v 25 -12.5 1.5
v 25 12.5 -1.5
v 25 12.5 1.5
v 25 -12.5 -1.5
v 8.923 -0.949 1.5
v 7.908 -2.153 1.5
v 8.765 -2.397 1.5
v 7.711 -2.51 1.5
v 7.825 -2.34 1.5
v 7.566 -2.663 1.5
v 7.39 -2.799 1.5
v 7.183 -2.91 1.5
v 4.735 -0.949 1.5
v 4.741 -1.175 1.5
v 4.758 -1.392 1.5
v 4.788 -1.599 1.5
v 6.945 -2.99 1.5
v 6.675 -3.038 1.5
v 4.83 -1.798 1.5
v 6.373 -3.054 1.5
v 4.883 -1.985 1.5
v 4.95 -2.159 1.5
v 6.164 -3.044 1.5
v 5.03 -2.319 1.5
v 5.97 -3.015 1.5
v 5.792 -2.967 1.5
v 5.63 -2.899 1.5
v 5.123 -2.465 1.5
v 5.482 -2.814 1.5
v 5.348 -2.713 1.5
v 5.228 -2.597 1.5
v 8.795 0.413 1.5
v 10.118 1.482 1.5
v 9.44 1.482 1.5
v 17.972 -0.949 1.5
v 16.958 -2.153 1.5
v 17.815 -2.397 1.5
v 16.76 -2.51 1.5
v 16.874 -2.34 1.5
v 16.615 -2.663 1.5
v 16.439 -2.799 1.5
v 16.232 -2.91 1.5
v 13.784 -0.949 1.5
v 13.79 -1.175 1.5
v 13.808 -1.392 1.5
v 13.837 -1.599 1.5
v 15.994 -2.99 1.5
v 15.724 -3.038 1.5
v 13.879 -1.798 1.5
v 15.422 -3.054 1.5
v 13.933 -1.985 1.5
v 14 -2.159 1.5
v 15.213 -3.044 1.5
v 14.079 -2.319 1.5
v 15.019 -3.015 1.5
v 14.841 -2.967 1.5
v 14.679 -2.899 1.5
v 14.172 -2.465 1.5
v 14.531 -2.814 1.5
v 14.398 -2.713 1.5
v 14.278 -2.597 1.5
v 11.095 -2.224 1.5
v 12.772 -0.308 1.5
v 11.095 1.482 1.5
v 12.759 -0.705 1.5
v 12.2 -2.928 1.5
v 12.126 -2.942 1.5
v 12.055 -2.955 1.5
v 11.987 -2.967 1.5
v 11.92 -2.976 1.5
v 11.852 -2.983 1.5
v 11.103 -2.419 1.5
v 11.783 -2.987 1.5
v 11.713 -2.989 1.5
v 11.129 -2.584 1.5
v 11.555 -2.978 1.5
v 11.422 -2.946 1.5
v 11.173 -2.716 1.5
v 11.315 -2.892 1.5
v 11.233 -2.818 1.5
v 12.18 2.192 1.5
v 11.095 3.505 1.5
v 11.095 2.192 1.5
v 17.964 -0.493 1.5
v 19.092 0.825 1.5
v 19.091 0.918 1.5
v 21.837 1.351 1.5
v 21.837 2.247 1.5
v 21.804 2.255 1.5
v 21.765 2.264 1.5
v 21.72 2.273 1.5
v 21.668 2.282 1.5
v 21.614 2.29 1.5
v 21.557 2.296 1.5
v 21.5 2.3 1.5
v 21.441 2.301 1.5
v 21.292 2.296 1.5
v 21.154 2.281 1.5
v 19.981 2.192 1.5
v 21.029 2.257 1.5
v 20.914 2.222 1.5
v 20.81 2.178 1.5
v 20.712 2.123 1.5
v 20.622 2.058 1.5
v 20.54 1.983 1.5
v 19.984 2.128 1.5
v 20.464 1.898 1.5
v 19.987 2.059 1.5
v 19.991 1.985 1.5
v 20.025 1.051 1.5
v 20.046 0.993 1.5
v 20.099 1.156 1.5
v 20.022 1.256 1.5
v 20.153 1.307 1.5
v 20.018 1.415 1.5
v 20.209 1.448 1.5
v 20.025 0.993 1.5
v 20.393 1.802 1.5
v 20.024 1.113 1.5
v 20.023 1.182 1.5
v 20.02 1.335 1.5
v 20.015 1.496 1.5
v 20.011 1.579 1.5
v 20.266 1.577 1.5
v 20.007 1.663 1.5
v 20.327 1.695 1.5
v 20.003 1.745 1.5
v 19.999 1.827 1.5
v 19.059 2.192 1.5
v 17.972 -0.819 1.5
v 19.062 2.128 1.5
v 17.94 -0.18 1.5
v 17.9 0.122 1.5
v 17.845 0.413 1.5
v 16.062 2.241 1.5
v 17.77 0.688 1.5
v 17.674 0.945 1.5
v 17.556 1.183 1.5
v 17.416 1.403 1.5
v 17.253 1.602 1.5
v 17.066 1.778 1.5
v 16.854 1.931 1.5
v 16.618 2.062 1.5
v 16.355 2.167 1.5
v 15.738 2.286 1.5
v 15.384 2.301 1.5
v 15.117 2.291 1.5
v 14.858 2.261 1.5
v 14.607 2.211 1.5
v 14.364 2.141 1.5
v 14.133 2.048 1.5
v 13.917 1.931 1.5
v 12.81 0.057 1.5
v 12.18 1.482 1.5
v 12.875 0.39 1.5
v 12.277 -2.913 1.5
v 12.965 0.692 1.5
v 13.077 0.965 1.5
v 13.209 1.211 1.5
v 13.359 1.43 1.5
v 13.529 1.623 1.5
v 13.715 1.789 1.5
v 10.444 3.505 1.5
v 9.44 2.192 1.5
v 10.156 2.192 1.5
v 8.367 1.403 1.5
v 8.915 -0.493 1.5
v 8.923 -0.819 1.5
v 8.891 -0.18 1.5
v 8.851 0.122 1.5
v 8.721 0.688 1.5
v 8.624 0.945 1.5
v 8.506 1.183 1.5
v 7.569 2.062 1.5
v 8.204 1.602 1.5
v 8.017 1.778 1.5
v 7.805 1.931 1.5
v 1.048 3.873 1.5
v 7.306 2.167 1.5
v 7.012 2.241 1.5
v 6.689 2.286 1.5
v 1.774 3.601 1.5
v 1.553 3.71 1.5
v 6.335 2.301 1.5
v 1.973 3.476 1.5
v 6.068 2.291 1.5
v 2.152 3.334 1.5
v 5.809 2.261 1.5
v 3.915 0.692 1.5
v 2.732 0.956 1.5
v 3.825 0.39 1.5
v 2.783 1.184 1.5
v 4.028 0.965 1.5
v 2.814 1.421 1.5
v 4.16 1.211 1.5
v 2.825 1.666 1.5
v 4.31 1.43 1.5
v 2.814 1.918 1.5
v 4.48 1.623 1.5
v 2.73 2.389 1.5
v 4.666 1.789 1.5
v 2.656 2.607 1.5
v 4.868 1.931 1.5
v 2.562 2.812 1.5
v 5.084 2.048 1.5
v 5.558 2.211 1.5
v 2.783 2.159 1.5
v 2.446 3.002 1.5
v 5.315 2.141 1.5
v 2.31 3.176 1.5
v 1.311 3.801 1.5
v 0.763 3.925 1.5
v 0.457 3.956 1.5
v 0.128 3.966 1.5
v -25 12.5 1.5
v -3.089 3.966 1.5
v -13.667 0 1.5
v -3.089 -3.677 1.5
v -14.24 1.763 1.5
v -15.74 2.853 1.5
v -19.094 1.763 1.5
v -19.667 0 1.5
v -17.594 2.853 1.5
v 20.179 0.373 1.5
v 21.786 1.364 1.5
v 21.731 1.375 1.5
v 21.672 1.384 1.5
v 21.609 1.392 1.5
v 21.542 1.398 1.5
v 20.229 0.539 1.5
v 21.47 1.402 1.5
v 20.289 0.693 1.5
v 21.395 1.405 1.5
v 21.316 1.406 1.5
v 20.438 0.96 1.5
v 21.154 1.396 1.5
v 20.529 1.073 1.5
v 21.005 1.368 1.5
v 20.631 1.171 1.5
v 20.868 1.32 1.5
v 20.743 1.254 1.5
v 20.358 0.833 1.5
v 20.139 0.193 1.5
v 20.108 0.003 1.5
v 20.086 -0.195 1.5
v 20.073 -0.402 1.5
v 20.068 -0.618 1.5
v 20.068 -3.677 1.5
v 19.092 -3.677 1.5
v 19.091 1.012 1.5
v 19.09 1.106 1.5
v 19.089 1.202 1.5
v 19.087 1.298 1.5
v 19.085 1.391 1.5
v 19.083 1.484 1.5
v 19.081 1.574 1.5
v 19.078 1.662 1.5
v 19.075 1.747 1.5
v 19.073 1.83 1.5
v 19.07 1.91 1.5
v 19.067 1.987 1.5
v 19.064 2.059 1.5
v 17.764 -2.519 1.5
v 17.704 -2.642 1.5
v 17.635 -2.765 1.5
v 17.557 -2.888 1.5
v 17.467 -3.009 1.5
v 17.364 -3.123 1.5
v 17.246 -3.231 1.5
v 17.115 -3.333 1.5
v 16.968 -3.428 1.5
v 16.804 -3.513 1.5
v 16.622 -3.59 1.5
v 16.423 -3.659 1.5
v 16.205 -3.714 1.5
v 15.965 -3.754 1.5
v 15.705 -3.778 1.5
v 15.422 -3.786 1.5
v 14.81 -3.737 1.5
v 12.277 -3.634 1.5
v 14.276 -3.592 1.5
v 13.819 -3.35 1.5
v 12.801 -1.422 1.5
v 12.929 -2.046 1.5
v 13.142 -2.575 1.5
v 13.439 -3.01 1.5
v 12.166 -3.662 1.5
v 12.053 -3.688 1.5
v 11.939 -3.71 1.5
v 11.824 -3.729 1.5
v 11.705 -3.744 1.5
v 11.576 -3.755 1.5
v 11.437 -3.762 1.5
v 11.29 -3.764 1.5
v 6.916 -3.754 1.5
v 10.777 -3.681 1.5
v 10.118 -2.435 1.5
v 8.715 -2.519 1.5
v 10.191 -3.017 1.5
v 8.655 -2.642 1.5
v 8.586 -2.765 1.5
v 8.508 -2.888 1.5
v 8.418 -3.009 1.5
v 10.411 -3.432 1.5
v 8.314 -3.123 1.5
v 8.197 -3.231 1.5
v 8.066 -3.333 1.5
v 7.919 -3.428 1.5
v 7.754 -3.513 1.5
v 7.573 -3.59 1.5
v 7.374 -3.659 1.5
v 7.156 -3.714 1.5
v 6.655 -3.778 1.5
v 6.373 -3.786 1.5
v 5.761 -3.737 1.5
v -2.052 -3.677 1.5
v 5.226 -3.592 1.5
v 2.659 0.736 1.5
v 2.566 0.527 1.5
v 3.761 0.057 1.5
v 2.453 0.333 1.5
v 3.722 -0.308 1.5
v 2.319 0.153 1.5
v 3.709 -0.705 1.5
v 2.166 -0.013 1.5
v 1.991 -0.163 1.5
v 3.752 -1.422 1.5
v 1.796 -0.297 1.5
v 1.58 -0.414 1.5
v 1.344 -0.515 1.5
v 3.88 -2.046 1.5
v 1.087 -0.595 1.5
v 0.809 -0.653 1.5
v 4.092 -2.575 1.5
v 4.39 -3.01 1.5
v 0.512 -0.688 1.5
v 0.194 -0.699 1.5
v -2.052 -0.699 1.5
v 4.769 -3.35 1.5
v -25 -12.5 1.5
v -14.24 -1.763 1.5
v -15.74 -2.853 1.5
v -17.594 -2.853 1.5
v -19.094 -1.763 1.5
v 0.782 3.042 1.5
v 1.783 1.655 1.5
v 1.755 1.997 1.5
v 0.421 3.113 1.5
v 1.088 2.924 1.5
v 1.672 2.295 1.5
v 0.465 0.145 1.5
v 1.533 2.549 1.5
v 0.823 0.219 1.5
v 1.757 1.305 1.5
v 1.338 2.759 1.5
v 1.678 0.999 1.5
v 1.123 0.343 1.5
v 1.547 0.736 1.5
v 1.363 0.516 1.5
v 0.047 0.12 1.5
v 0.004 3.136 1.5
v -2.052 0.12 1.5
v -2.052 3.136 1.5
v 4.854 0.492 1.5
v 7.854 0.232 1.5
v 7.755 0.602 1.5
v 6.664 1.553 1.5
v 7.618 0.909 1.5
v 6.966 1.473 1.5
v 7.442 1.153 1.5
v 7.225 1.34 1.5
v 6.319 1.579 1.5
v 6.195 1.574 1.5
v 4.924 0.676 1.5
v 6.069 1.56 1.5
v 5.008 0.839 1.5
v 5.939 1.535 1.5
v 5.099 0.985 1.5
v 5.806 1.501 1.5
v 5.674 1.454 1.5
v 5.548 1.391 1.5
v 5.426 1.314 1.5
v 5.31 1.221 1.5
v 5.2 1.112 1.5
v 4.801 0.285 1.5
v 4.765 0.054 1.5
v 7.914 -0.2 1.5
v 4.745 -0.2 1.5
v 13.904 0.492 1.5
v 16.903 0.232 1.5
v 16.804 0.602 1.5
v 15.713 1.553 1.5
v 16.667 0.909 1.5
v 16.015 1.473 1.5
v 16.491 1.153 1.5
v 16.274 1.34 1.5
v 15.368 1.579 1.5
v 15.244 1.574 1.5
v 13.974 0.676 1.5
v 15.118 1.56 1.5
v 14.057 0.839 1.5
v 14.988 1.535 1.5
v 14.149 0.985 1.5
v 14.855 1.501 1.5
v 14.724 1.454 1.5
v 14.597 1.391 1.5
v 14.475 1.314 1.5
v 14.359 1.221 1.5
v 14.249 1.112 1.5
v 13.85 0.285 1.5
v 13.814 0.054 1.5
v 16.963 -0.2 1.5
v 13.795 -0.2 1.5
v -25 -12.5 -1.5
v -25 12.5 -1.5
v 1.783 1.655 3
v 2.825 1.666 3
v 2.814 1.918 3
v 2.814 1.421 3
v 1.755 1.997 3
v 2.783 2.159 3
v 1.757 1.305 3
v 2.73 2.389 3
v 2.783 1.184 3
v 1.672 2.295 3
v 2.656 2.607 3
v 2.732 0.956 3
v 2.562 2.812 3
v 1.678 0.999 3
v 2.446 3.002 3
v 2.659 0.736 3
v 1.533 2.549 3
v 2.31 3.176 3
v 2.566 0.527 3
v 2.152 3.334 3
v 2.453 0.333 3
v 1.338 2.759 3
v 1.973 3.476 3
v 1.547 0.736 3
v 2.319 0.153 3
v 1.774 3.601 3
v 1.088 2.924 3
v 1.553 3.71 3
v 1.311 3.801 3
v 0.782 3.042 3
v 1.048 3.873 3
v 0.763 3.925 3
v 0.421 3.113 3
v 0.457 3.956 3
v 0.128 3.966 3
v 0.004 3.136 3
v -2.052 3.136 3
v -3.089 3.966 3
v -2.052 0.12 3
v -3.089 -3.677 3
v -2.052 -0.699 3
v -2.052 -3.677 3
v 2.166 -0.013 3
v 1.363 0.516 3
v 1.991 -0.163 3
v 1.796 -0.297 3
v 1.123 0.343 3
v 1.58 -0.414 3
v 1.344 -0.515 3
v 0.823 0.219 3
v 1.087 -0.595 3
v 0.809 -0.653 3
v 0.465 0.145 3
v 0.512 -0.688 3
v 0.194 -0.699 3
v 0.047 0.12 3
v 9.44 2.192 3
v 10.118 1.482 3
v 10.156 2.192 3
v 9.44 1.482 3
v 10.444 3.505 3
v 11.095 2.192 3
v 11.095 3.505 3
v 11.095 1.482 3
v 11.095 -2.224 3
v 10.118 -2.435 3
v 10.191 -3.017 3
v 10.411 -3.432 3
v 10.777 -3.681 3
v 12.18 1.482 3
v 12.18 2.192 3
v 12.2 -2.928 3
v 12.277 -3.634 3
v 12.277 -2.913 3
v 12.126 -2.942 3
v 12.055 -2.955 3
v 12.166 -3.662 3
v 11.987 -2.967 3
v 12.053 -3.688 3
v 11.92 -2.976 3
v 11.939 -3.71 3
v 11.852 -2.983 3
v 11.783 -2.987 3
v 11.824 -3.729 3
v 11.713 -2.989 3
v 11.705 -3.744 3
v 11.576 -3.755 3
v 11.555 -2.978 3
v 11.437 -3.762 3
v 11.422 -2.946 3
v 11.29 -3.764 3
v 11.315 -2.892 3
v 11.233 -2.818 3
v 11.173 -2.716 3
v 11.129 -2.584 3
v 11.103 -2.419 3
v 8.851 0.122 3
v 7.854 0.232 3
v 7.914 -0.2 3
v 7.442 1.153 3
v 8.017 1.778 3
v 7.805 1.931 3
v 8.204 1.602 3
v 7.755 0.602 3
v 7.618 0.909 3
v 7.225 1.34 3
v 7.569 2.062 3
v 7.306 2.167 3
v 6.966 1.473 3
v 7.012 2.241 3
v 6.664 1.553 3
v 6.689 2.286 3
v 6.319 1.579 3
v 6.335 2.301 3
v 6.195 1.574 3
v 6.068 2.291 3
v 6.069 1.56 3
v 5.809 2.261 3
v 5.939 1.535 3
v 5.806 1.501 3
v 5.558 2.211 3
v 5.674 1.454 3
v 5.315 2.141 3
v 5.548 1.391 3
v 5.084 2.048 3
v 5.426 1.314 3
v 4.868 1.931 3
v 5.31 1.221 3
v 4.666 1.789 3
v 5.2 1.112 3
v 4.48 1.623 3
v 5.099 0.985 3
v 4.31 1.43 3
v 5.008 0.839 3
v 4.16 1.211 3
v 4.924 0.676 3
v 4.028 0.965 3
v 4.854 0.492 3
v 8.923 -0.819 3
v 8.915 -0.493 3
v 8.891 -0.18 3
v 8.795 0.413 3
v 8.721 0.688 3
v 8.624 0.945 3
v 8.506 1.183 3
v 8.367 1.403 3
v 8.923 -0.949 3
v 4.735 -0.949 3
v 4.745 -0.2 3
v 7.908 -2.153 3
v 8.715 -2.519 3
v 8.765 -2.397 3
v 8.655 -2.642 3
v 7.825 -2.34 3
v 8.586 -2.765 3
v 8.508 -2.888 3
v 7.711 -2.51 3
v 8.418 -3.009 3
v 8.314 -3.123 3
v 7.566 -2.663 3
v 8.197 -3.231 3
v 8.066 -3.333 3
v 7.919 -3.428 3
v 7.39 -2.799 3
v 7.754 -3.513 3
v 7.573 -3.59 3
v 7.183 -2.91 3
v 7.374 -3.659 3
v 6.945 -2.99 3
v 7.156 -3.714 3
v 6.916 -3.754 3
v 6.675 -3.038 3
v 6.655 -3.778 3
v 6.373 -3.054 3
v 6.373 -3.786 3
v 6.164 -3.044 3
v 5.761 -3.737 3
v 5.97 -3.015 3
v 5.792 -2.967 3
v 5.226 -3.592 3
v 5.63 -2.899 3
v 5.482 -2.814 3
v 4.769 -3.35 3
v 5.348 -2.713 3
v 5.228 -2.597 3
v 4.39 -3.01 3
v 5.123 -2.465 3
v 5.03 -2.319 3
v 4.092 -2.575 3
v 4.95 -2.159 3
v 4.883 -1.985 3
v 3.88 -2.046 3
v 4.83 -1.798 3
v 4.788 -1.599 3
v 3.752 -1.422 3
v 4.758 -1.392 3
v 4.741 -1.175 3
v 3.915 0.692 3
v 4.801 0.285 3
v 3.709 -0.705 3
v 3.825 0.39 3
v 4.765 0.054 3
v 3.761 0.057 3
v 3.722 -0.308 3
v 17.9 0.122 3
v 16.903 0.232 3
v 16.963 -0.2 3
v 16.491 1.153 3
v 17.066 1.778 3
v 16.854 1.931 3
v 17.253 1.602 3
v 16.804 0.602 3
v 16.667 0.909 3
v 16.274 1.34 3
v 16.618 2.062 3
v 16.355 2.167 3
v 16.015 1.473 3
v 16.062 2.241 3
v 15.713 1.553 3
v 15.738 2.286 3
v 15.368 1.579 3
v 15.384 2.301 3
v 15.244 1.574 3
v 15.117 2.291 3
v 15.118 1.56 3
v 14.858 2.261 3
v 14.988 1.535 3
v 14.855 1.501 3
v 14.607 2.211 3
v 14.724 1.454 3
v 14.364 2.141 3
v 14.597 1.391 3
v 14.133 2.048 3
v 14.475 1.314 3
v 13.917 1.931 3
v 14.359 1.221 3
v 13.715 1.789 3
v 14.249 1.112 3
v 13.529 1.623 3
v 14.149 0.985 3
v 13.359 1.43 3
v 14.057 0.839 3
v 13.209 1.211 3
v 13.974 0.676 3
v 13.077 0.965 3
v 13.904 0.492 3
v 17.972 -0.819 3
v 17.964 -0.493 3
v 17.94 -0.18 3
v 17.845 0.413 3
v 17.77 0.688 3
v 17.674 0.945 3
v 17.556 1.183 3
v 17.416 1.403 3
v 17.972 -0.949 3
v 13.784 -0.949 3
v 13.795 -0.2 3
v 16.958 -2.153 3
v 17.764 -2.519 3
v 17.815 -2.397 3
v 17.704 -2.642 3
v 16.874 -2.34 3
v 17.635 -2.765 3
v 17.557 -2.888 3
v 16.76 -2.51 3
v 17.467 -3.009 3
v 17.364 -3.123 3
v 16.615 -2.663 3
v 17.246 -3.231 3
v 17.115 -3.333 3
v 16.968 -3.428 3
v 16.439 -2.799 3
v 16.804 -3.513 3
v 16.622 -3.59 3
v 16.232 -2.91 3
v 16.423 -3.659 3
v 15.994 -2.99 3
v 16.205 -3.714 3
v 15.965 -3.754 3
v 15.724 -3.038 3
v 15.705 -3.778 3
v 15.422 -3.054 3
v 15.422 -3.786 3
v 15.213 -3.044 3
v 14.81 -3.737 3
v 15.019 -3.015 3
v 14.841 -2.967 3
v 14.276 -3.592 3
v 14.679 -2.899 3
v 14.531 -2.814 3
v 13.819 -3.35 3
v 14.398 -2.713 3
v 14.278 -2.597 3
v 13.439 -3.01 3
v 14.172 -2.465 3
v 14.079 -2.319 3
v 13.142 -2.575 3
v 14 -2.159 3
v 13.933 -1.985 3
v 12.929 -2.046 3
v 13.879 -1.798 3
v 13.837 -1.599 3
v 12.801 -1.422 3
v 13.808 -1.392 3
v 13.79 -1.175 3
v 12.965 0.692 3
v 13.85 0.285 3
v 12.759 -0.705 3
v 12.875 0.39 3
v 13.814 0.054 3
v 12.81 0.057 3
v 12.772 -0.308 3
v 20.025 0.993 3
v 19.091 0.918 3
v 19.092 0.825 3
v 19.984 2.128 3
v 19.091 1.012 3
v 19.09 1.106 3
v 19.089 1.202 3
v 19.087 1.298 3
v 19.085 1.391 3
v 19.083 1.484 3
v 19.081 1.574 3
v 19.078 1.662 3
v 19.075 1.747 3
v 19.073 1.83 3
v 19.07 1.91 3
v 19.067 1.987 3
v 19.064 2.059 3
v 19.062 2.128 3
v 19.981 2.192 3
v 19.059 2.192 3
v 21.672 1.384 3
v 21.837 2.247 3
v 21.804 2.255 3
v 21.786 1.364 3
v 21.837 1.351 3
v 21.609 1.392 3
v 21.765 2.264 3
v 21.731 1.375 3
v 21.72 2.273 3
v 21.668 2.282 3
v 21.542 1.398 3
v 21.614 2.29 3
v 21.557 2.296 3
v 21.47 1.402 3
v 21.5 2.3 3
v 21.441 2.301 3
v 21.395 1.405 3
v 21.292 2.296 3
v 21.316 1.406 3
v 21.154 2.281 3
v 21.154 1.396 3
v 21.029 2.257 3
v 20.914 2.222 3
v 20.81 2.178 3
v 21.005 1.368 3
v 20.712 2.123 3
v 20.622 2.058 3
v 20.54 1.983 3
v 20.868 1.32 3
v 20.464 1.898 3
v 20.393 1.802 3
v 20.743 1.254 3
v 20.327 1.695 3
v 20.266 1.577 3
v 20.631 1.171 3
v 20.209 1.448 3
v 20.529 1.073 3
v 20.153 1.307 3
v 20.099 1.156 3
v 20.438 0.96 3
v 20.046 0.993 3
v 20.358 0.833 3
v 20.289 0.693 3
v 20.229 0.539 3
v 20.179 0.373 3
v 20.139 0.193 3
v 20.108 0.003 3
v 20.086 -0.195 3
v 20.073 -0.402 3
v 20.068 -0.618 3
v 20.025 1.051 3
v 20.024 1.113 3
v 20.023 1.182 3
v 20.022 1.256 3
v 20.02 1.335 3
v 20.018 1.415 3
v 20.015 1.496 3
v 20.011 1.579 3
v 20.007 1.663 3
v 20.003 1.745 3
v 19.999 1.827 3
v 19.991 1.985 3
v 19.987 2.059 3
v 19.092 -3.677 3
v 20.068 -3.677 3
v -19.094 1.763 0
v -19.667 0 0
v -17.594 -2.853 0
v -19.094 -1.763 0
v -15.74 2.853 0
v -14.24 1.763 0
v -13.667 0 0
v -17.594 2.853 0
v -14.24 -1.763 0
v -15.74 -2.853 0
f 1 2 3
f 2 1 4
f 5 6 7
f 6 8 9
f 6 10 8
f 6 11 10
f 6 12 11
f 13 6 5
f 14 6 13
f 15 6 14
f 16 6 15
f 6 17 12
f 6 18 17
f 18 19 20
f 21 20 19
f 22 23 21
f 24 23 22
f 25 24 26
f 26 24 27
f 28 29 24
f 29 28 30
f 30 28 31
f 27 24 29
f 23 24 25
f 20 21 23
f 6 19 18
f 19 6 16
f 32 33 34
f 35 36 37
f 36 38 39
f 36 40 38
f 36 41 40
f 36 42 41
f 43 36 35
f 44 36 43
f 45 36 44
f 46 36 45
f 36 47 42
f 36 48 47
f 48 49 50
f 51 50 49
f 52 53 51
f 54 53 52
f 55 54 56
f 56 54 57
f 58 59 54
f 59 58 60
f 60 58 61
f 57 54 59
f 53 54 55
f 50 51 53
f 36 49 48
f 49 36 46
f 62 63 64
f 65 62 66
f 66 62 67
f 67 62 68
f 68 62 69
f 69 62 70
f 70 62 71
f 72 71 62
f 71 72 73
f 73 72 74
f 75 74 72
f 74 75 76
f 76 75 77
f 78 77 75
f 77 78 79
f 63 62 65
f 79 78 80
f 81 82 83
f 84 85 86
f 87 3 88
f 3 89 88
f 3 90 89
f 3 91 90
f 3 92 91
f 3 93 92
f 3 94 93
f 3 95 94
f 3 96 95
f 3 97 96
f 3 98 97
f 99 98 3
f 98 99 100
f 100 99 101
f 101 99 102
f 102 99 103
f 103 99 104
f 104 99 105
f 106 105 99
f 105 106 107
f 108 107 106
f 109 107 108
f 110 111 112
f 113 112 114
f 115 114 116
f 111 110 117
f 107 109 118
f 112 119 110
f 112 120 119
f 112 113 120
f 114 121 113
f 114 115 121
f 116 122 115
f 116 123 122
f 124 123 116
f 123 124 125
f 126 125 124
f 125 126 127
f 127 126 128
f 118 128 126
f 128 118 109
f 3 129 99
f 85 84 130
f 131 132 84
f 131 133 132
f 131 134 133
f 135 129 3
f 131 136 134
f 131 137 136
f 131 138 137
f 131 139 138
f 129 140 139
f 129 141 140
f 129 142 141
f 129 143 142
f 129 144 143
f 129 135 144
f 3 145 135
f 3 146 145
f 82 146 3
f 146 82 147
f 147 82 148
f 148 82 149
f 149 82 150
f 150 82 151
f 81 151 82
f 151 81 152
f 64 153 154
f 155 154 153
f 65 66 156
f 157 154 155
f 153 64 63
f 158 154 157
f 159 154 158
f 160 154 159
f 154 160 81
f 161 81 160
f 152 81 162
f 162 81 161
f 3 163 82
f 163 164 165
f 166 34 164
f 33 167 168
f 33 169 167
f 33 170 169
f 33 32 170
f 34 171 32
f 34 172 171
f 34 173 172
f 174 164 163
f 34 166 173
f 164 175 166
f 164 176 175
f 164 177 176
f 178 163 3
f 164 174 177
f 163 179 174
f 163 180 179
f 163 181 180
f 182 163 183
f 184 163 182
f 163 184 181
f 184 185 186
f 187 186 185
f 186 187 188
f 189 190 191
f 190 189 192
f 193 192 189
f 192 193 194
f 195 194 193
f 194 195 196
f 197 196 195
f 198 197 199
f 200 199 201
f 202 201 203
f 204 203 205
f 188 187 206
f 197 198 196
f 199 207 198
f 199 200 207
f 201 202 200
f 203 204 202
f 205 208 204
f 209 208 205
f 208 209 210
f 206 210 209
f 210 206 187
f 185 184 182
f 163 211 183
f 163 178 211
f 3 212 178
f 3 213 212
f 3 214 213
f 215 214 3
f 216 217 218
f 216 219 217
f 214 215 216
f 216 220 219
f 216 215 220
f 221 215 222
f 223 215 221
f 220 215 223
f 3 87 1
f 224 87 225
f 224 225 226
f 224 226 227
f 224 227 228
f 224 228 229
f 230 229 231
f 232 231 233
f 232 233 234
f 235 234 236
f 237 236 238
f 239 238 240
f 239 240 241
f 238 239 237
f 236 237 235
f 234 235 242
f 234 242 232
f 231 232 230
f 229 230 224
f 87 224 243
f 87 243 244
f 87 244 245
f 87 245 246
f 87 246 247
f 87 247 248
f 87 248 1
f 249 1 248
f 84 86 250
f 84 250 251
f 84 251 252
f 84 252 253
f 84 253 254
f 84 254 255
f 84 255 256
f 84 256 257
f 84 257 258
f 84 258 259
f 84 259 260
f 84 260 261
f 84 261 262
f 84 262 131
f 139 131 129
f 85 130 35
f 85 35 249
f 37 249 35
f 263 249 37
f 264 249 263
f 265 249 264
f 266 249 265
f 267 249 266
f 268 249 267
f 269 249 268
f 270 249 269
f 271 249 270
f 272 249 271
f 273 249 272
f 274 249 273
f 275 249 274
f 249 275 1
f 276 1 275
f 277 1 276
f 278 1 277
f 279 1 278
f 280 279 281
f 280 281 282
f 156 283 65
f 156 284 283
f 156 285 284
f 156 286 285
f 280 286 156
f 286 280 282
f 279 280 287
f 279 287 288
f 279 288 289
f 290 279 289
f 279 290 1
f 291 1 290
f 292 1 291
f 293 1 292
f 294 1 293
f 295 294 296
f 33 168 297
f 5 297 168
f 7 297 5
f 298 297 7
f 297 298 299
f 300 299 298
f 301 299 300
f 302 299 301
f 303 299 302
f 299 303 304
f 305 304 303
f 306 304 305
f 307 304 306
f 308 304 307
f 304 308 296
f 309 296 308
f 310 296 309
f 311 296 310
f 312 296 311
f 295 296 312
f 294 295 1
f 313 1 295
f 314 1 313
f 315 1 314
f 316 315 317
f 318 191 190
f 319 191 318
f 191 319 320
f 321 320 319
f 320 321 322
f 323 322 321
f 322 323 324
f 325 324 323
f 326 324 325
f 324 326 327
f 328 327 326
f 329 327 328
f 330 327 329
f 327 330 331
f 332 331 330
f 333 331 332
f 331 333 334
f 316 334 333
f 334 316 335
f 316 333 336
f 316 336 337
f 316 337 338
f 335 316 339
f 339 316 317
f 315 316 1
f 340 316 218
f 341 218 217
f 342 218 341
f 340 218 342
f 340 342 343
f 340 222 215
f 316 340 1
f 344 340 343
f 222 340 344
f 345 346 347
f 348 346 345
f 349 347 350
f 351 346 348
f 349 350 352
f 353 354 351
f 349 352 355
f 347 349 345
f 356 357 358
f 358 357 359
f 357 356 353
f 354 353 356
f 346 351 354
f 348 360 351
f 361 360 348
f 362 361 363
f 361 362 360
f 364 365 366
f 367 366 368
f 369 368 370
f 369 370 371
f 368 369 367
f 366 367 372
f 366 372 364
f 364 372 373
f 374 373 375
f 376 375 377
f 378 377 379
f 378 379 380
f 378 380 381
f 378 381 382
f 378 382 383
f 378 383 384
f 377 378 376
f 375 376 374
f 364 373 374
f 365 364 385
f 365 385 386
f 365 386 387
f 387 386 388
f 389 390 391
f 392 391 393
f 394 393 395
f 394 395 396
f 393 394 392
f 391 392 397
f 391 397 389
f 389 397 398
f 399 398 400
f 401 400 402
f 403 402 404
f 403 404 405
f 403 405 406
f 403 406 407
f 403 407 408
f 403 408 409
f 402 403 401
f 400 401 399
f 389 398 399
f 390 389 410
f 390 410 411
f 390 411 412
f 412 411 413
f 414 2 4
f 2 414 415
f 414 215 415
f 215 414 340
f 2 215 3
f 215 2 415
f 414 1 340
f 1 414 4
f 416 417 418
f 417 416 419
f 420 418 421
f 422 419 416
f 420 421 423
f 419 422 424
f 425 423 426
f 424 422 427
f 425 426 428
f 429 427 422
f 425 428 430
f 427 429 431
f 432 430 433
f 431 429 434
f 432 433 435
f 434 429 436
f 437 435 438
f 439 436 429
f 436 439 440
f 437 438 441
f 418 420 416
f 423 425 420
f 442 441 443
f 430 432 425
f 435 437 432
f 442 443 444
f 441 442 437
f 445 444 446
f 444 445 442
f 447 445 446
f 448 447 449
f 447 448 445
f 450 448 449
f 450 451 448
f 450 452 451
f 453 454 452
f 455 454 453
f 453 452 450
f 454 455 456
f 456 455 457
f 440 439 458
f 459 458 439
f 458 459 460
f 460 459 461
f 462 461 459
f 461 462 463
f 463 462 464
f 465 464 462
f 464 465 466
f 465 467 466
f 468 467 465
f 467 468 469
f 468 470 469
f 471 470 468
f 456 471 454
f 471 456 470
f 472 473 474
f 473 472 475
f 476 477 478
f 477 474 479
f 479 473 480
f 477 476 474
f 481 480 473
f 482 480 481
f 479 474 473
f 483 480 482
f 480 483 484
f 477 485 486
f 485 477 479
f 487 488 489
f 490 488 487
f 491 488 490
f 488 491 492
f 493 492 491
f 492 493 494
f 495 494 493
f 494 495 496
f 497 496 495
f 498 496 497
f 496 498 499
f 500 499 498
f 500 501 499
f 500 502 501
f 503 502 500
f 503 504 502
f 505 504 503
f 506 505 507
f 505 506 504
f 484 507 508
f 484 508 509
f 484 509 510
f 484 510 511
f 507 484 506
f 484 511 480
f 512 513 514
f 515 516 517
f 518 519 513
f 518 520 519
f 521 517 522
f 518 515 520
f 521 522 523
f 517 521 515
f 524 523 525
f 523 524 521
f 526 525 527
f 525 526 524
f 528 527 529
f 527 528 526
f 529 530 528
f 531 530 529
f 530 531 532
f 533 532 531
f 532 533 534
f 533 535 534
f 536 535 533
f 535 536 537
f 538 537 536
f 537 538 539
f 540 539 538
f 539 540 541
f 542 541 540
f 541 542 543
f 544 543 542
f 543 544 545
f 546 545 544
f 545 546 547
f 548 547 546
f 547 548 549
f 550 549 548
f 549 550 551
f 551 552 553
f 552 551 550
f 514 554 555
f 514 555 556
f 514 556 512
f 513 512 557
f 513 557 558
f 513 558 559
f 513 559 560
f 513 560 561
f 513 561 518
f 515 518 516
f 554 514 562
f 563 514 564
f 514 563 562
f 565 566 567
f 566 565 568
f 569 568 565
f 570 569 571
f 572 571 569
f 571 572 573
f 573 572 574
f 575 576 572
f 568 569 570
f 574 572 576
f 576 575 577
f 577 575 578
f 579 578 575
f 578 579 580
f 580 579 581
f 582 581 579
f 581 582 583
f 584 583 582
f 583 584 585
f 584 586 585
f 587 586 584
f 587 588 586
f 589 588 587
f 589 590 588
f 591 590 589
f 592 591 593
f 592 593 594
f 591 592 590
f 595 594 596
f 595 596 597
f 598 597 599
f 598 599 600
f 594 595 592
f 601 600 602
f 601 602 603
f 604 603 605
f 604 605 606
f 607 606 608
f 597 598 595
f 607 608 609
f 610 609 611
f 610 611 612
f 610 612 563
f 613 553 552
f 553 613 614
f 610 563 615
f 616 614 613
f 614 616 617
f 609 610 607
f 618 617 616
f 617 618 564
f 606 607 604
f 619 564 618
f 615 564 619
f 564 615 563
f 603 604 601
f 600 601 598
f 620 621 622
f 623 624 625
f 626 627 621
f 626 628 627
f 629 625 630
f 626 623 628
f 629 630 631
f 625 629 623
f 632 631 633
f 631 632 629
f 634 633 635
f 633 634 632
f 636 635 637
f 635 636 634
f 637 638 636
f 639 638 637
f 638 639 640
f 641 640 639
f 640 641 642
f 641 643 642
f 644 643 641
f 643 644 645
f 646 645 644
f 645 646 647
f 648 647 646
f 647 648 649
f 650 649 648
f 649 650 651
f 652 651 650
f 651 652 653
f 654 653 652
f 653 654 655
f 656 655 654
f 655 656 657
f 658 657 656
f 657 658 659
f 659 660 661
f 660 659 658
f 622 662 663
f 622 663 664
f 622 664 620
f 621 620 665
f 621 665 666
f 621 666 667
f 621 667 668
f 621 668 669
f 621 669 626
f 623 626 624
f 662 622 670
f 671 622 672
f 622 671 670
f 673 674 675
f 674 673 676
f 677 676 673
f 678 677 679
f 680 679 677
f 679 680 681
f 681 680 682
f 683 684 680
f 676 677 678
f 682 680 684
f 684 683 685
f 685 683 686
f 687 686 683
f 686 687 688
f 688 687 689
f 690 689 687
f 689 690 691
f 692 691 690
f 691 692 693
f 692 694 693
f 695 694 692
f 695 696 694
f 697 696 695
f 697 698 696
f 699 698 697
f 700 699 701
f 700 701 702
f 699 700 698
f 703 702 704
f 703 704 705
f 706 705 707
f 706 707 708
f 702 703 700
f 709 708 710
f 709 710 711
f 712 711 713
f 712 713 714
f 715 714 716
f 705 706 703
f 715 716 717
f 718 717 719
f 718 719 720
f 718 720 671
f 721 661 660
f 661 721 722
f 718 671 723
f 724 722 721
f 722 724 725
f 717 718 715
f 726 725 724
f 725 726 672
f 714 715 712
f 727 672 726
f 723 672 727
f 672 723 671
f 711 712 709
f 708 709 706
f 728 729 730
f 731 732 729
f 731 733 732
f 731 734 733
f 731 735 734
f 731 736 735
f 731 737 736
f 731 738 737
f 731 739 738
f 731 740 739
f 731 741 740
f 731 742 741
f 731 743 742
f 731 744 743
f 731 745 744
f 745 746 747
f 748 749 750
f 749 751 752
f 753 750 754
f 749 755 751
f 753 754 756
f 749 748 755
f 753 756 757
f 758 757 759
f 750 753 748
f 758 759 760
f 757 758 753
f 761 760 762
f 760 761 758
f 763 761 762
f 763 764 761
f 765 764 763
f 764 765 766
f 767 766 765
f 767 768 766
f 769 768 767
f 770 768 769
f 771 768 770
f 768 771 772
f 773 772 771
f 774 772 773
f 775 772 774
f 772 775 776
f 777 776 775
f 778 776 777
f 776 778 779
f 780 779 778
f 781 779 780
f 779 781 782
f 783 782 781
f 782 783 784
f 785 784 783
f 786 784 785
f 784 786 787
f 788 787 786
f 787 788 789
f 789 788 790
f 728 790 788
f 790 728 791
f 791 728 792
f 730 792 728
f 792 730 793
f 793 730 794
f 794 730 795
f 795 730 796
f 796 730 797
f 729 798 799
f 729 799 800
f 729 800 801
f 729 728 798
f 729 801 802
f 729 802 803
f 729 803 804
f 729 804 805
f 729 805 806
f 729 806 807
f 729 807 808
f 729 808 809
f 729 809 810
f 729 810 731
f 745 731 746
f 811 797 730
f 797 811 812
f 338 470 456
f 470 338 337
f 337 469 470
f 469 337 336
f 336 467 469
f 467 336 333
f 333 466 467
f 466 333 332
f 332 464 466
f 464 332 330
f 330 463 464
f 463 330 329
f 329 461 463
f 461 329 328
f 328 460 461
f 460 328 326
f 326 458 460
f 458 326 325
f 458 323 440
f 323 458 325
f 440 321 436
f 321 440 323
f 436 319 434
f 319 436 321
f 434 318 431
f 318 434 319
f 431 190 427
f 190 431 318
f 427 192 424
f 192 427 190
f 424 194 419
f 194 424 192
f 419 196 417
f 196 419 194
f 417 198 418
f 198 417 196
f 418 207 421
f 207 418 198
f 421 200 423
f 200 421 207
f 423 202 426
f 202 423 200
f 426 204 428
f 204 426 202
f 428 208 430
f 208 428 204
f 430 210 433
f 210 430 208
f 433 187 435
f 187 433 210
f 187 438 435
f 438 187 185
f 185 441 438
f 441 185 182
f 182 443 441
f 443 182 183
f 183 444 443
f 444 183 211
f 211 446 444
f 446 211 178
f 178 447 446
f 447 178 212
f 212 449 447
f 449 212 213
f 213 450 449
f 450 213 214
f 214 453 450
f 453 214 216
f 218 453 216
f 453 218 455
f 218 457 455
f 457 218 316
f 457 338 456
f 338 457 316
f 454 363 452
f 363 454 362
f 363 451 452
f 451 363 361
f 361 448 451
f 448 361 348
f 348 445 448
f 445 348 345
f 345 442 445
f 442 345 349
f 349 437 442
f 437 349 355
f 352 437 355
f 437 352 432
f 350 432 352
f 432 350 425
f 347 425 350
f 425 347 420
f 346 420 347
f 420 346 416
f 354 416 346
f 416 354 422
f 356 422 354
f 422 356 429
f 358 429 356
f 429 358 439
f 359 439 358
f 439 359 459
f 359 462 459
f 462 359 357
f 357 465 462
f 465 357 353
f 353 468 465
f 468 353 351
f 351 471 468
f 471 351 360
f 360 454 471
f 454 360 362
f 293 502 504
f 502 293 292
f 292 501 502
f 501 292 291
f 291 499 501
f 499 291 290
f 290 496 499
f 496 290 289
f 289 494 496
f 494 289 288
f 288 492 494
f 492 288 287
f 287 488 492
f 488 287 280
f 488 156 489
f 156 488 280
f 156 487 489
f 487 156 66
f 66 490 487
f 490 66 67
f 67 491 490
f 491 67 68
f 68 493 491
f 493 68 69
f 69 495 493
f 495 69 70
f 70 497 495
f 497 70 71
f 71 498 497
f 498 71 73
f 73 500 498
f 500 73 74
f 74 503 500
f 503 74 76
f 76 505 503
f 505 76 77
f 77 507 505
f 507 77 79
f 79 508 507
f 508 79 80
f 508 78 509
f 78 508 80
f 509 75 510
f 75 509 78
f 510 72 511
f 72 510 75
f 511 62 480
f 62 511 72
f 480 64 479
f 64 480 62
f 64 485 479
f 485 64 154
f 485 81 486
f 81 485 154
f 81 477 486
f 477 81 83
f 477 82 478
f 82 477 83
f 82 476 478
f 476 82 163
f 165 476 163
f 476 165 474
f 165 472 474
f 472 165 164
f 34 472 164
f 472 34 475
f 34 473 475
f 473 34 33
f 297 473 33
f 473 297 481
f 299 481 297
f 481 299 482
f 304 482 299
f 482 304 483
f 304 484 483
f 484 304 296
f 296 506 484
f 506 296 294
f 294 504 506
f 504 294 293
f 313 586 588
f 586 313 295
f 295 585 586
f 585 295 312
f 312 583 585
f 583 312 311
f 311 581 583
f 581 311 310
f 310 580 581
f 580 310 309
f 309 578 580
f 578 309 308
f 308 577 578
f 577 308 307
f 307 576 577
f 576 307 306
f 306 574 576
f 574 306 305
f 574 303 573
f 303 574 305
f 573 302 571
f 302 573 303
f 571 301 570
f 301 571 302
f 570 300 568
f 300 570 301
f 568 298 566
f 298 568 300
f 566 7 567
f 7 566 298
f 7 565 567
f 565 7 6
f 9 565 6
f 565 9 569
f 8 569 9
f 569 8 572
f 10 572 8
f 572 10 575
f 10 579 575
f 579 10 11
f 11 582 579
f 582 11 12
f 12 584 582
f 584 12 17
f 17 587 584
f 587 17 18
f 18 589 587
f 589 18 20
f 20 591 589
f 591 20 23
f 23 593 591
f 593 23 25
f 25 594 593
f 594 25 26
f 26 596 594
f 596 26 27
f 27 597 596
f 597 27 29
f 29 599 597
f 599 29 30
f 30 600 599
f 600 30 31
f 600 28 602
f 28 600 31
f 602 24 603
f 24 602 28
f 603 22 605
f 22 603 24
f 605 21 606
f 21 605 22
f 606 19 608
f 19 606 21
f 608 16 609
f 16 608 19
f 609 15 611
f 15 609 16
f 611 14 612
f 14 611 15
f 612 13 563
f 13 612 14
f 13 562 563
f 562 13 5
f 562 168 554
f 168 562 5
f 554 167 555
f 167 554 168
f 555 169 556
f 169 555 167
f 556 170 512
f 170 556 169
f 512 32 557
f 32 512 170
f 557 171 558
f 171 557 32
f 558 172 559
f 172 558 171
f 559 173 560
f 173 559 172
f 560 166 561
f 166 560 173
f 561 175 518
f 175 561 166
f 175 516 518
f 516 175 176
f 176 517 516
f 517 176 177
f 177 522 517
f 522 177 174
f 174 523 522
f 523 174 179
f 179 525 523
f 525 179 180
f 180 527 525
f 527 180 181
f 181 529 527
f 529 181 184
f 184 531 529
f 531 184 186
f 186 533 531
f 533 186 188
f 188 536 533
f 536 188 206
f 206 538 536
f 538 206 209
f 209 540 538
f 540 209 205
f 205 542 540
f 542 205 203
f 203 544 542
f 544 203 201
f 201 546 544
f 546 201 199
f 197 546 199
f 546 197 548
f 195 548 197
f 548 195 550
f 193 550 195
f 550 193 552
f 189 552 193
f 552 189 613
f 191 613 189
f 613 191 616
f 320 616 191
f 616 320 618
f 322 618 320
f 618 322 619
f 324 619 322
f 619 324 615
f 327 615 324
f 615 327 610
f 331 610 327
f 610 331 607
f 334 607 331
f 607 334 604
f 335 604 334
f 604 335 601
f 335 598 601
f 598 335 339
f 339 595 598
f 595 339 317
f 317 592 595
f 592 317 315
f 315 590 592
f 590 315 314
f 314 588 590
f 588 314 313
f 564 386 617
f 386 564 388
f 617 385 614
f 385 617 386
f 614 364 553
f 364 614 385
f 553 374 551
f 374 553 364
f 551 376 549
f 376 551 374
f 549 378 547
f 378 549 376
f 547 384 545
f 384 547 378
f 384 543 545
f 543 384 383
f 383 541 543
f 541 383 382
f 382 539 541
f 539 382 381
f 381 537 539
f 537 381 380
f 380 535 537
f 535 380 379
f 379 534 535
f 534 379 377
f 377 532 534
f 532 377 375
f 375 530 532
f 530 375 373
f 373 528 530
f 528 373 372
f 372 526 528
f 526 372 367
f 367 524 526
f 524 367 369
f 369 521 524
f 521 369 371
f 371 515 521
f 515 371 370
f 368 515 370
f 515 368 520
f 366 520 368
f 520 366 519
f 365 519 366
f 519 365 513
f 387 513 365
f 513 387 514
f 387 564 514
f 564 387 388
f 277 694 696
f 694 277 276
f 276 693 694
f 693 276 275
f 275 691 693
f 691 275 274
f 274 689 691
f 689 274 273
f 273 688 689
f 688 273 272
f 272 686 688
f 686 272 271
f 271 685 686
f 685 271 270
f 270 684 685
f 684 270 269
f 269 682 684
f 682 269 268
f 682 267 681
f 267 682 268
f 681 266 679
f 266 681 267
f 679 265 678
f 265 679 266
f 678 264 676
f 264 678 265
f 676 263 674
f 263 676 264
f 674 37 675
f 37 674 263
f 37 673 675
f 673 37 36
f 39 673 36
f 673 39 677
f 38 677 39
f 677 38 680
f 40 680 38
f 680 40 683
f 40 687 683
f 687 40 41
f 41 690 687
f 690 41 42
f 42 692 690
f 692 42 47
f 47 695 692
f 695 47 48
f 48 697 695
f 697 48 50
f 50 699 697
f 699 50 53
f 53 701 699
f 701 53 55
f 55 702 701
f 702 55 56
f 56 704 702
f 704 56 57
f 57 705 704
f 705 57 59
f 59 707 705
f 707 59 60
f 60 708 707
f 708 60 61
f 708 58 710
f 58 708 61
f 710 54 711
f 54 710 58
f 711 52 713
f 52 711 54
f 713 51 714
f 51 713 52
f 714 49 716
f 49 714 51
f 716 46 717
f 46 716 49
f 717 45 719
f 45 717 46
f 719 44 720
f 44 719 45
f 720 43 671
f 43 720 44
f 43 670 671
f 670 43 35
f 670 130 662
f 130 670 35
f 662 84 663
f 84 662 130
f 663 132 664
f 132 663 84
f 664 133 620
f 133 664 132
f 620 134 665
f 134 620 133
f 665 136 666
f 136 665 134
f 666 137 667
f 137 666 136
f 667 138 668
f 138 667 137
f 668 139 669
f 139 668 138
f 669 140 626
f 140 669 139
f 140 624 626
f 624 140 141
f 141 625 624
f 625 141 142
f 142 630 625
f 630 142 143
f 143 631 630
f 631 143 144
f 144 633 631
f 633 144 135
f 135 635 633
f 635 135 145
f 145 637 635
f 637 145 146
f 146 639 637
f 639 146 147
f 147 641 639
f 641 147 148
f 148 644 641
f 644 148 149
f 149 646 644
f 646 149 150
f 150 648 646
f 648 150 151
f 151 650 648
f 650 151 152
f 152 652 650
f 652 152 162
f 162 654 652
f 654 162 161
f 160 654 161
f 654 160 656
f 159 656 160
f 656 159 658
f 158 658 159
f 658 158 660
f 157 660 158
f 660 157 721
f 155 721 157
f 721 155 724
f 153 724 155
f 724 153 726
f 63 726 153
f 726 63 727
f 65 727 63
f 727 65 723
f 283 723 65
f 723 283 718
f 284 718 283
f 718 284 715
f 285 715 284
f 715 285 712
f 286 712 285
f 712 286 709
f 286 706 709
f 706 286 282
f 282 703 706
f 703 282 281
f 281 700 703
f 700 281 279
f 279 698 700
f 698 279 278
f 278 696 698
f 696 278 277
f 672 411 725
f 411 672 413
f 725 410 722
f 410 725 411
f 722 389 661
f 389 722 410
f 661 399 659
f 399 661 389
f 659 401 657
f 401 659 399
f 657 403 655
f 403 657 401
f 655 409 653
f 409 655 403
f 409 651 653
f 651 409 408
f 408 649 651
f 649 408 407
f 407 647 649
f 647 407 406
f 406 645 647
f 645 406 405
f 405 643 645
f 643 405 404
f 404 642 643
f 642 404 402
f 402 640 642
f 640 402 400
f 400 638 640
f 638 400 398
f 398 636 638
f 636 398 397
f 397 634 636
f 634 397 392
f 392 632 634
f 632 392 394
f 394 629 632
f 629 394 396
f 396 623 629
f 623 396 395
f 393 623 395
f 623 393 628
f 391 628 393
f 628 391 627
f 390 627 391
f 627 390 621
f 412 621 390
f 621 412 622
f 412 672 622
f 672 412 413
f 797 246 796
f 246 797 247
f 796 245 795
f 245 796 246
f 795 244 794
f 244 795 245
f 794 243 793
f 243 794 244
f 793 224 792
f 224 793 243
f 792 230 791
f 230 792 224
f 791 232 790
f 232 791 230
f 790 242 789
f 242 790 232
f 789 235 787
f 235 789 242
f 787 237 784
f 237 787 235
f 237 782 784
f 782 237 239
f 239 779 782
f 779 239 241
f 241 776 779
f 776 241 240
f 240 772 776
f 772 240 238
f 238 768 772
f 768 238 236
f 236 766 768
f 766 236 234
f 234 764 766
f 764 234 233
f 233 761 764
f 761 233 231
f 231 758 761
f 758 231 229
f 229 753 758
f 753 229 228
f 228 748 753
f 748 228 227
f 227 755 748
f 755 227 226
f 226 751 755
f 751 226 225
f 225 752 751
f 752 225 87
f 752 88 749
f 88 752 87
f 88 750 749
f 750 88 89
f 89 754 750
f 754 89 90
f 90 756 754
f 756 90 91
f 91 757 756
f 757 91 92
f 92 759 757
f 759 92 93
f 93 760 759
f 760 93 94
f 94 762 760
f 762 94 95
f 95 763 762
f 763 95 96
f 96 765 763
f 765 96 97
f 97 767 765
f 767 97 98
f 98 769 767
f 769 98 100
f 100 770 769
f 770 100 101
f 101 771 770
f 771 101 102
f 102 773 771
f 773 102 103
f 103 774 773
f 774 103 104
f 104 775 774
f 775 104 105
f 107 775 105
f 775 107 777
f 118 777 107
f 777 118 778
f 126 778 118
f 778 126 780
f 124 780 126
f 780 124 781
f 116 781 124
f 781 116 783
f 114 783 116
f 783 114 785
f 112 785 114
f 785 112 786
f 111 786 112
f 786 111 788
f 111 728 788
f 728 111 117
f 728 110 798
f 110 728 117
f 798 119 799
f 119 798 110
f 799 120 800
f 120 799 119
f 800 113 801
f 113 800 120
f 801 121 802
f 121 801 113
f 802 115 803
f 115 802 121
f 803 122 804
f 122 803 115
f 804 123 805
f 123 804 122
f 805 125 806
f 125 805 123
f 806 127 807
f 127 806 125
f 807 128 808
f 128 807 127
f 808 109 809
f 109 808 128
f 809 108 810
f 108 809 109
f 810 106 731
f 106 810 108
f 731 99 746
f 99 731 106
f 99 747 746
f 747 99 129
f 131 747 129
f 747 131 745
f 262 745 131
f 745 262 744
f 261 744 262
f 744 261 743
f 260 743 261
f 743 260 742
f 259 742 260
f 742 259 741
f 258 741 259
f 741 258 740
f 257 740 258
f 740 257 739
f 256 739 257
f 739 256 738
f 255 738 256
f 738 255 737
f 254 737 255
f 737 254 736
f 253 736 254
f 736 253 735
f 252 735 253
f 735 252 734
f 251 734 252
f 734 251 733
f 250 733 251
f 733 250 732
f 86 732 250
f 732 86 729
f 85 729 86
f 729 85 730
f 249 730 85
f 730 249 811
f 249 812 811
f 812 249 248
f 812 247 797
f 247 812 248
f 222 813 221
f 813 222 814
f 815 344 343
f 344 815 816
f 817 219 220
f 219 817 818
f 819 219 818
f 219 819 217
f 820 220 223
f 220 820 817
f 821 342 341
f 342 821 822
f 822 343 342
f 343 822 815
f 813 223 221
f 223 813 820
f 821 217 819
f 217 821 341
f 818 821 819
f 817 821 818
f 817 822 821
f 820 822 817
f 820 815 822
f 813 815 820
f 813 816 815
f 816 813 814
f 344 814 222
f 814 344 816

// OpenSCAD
name = "Peter";
font = "Liberation Sans";
letter_height = 3;
letter_size = 8;
tag_depth = 25;
tag_width = 50;
tag_height = 3;
hole_radus = 3;


module 3dName(n) {
    linear_extrude(height = letter_height) {
        text(n, size = letter_size, font = font, valign = "center");
    }
}

difference() {
    union() {
        color("blue") translate([0,0,0]) cube([tag_width,tag_depth,tag_height],true);
        translate([-letter_size/2, 0, 0]) rotate([0, 0, 0]) 3dName(name);
    }
    translate([-(tag_width/3),0,0])cylinder(h=tag_height,r=hole_radus);
}

module createMeniscus(h,radius) // This module creates the shape that needs to be substracted from a cube to make its corners rounded.
difference(){        //This shape is basicly the difference between a quarter of cylinder and a cube
   translate([radius/2+0.1,radius/2+0.1,0]){
      cube([radius+0.2,radius+0.1,h+0.2],center=true);         // All that 0.x numbers are to avoid "ghost boundaries" when substracting
   }

   cylinder(h=h+0.2,r=radius,$fn = 25,center=true);
}


module roundCornersCube(x,y,z,r)  // Now we just substract the shape we have created in the four corners
difference(){
   cube([x,y,z], center=true);

translate([x/2-r,y/2-r]){  // We move to the first corner (x,y)
      rotate(0){  
         createMeniscus(z,r); // And substract the meniscus
      }
   }
   translate([-x/2+r,y/2-r]){ // To the second corner (-x,y)
      rotate(90){
         createMeniscus(z,r); // But this time we have to rotate the meniscus 90 deg
      }
   }
      translate([-x/2+r,-y/2+r]){ // ... 
      rotate(180){
         createMeniscus(z,r);
      }
   }
      translate([x/2-r,-y/2+r]){
      rotate(270){
         createMeniscus(z,r);
      }
   }
}
